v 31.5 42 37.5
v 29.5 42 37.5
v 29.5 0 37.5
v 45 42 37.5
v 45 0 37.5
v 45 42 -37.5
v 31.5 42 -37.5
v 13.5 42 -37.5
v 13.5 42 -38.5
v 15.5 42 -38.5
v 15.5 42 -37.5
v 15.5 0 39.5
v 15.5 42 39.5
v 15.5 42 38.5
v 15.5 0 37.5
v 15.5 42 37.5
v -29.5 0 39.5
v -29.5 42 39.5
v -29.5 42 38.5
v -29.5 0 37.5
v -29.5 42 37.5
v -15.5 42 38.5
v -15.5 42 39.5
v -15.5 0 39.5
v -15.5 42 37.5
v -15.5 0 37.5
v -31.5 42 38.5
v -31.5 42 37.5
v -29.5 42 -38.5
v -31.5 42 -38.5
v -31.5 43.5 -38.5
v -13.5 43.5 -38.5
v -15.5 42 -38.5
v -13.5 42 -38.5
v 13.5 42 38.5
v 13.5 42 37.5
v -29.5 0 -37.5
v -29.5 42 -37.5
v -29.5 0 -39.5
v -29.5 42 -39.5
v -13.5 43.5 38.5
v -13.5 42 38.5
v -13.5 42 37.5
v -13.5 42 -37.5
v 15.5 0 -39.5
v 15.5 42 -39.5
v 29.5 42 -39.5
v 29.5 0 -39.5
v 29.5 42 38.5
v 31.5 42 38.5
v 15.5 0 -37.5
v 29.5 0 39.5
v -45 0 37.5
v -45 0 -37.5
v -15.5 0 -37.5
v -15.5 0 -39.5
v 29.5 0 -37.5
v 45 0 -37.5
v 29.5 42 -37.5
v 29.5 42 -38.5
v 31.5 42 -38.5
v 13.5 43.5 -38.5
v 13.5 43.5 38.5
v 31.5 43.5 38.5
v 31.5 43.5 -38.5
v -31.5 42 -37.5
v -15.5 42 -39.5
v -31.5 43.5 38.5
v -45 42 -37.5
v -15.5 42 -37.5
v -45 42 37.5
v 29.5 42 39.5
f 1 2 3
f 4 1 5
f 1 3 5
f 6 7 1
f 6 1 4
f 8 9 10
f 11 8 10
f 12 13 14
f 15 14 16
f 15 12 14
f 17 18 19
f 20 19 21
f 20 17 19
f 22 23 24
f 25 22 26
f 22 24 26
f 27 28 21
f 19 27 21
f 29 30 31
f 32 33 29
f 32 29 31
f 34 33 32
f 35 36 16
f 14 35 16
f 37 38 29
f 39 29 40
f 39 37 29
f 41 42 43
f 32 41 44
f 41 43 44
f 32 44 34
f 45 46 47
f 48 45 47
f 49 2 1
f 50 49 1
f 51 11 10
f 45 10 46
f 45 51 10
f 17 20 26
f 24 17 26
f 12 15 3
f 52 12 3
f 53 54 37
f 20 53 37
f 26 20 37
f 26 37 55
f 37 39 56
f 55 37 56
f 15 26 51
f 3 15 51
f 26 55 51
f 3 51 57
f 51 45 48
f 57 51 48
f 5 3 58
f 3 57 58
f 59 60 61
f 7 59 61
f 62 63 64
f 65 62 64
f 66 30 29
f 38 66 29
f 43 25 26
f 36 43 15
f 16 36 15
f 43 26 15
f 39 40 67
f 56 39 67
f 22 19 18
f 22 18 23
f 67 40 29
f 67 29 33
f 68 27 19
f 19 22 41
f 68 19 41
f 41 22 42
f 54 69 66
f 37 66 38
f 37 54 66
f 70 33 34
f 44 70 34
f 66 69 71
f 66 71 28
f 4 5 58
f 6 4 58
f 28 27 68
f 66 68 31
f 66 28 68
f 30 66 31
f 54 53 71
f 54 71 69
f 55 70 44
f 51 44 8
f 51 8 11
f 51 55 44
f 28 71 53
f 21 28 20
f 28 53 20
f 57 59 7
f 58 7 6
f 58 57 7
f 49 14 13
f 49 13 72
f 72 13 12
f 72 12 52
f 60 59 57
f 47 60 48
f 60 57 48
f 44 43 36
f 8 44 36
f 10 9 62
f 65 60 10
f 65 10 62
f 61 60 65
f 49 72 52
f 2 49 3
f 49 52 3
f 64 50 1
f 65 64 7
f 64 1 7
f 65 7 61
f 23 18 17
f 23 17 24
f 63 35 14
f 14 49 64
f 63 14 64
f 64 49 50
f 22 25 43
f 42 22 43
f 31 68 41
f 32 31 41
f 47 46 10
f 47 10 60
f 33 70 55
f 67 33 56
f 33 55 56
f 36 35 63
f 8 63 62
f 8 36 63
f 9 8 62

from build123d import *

# Parameters (mm, degrees)
SK_P01_PACK_W   = 90
SK_P01_PACK_H   = 75
P01_PACK_DEPTH  = 42
P02_STRAP_START = 42
SK_P02_STRAP_W  = 18
SK_P02_STRAP_H  = 77
P02_STRAP_DEPTH = 1.5
P03_STRAP_START = 42
SK_P03_STRAP_W  = 18
SK_P03_STRAP_H  = 77
P03_STRAP_DEPTH = 1.5
SK_P04_STRAP_W  = 14
SK_P04_STRAP_H  = 2
P04_STRAP_DEPTH = 42
SK_P05_STRAP_W  = 14
SK_P05_STRAP_H  = 2
P05_STRAP_DEPTH = 42
SK_P06_STRAP_W  = 14
SK_P06_STRAP_H  = 2
P06_STRAP_DEPTH = 42
SK_P07_STRAP_W  = 14
SK_P07_STRAP_H  = 2
P07_STRAP_DEPTH = 42


with BuildPart() as part:
    # SK_P01_Pack → P01_Pack (new body)
    with BuildSketch(Plane(origin=(0, 0, 0), x_dir=(1, 0, 0), z_dir=(0, 1, 0))):
        Rectangle(SK_P01_PACK_W, SK_P01_PACK_H)
    extrude(amount=P01_PACK_DEPTH)

    # SK_P02_Strap → P02_Strap (add)
    with BuildSketch(Plane(origin=(0, 0, 0), x_dir=(1, 0, 0), z_dir=(0, 1, 0)).offset(P02_STRAP_START)):
        with Locations((-22.5, 0)):
            Rectangle(SK_P02_STRAP_W, SK_P02_STRAP_H)
    extrude(amount=P02_STRAP_DEPTH)

    # SK_P03_Strap → P03_Strap (add)
    with BuildSketch(Plane(origin=(0, 0, 0), x_dir=(1, 0, 0), z_dir=(0, 1, 0)).offset(P03_STRAP_START)):
        with Locations((22.5, 0)):
            Rectangle(SK_P03_STRAP_W, SK_P03_STRAP_H)
    extrude(amount=P03_STRAP_DEPTH)

    # SK_P04_Strap → P04_Strap (add)
    with BuildSketch(Plane(origin=(0, 0, 0), x_dir=(1, 0, 0), z_dir=(0, 1, 0))):
        with Locations((-22.5, 38.5)):
            Rectangle(SK_P04_STRAP_W, SK_P04_STRAP_H)
    extrude(amount=P04_STRAP_DEPTH)

    # SK_P05_Strap → P05_Strap (add)
    with BuildSketch(Plane(origin=(0, 0, 0), x_dir=(1, 0, 0), z_dir=(0, 1, 0))):
        with Locations((-22.5, -38.5)):
            Rectangle(SK_P05_STRAP_W, SK_P05_STRAP_H)
    extrude(amount=P05_STRAP_DEPTH)

    # SK_P06_Strap → P06_Strap (add)
    with BuildSketch(Plane(origin=(0, 0, 0), x_dir=(1, 0, 0), z_dir=(0, 1, 0))):
        with Locations((22.5, 38.5)):
            Rectangle(SK_P06_STRAP_W, SK_P06_STRAP_H)
    extrude(amount=P06_STRAP_DEPTH)

    # SK_P07_Strap → P07_Strap (add)
    with BuildSketch(Plane(origin=(0, 0, 0), x_dir=(1, 0, 0), z_dir=(0, 1, 0))):
        with Locations((22.5, -38.5)):
            Rectangle(SK_P07_STRAP_W, SK_P07_STRAP_H)
    extrude(amount=P07_STRAP_DEPTH)


solid = part.part
